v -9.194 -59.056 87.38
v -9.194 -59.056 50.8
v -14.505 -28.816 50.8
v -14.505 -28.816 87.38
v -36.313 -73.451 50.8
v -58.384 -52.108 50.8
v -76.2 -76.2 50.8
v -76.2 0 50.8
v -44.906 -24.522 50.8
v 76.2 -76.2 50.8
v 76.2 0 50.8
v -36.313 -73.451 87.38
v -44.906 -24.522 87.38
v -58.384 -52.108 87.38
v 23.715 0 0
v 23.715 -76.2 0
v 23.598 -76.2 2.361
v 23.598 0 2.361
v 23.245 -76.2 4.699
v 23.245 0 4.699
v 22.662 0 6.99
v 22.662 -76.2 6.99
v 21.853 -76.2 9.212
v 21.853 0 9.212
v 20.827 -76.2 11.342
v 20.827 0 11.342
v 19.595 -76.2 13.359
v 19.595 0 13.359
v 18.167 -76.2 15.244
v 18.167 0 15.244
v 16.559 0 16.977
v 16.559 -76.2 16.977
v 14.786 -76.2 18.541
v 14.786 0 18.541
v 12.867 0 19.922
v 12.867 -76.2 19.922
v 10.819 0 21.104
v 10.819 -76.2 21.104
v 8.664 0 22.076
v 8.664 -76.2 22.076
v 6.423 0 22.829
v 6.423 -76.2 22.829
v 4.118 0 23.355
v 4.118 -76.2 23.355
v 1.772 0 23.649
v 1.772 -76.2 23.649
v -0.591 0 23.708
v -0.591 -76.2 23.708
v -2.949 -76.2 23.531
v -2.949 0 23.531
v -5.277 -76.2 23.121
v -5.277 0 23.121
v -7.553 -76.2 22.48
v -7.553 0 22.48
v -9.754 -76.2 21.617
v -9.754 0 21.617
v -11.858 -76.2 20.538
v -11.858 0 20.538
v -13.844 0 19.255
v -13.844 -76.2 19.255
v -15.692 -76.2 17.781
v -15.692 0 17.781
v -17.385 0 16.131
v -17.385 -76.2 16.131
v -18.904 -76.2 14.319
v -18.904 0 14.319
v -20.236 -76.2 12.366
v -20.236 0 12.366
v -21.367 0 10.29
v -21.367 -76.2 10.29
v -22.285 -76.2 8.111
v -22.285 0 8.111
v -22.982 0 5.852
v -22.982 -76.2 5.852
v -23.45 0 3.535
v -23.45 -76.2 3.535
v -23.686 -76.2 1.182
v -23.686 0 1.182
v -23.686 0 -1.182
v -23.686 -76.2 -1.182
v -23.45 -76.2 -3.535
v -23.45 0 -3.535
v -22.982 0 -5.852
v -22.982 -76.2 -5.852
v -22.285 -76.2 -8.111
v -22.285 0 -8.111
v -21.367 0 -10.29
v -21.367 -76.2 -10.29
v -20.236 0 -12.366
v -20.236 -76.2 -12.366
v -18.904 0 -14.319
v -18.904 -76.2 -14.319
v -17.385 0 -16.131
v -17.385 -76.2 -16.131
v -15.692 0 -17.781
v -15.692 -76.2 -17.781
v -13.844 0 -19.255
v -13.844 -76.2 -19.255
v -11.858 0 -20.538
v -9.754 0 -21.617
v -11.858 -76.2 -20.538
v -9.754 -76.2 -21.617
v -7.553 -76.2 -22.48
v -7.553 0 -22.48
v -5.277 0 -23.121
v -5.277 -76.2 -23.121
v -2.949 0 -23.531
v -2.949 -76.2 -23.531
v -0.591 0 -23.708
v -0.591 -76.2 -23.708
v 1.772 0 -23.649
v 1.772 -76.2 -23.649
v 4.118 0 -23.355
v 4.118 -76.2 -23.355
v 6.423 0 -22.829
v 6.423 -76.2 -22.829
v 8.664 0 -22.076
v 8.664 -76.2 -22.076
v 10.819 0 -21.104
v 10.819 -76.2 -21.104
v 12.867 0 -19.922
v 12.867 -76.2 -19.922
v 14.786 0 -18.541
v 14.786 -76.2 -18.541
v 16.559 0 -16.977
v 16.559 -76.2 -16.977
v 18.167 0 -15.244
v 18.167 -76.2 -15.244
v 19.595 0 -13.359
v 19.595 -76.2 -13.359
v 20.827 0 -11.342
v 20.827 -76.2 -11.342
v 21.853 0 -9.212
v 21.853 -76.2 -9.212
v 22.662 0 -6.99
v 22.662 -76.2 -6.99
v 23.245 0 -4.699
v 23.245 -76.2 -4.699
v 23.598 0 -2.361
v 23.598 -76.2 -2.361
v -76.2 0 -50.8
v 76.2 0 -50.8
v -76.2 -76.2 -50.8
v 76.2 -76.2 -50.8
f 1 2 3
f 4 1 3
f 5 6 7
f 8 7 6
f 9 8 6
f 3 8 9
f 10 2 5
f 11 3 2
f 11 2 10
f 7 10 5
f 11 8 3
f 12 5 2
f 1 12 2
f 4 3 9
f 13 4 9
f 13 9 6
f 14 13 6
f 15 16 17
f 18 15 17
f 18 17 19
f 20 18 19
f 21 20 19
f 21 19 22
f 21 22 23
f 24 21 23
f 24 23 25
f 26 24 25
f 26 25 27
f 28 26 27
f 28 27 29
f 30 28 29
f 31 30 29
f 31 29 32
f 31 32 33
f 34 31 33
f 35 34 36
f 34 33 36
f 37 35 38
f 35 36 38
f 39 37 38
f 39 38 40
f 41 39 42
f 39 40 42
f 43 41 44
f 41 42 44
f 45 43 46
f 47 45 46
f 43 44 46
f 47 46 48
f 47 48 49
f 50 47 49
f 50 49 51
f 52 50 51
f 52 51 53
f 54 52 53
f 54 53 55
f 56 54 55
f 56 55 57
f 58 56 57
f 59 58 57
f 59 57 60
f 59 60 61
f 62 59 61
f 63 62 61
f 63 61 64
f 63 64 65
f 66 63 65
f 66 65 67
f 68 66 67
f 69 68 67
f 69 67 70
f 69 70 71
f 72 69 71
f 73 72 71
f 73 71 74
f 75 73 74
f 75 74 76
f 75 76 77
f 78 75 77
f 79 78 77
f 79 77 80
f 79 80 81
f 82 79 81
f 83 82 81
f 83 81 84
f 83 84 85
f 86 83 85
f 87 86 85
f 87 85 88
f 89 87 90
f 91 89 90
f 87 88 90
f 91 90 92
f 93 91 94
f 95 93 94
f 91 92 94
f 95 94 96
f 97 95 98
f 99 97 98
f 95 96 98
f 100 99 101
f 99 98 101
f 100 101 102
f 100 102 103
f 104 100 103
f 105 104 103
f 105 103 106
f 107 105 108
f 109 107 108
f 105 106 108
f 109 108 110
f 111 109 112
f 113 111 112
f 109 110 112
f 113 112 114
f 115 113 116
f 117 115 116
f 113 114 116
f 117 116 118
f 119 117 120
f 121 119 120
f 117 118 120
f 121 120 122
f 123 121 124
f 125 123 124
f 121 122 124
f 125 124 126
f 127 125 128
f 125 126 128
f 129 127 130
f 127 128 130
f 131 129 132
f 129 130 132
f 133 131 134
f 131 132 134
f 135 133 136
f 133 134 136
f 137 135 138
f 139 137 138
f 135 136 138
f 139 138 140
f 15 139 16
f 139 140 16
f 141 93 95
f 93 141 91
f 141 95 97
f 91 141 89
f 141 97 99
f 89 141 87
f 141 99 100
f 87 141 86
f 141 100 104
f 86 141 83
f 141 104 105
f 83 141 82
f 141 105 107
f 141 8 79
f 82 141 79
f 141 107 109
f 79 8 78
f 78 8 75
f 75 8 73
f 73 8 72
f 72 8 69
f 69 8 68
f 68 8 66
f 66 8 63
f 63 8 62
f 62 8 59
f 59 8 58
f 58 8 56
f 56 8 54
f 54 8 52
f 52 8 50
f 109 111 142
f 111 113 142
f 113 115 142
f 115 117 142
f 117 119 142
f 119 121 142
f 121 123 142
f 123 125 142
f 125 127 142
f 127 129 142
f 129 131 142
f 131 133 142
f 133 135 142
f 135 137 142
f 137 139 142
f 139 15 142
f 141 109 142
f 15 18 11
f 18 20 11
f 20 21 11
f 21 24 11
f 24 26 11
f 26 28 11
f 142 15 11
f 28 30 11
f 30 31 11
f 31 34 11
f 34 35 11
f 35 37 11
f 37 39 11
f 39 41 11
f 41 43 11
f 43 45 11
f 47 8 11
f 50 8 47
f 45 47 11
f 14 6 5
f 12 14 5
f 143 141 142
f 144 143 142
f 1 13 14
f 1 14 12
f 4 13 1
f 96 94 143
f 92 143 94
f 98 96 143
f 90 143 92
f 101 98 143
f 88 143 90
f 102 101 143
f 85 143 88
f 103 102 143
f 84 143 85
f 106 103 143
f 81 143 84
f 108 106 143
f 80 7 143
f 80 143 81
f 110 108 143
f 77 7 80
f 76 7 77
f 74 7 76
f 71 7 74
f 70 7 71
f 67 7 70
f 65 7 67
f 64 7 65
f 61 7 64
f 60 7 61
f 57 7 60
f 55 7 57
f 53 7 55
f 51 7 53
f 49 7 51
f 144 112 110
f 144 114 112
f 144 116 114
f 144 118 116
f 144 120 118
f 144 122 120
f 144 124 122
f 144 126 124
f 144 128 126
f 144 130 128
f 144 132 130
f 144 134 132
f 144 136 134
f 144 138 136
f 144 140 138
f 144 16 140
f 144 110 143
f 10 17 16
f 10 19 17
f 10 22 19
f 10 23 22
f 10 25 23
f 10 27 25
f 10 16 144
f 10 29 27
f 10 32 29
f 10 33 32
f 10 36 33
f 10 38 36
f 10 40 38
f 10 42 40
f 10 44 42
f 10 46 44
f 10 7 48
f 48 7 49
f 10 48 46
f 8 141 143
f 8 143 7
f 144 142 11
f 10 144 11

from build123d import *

# Parameters (mm, degrees)
F0_W     = 152.4
F0_H     = 101.6
F1_DEPTH = 76.2
F2_R     = 23.715347
F3_DEPTH = 76.201
F5_DEPTH = 36.57971


with BuildPart() as f1:
    # F0 (on Front) → F1 (new body)
    with BuildSketch(Plane.XZ):
        Rectangle(F0_W, F0_H)
    extrude(amount=F1_DEPTH)

    # F2 (on face) → F3 (cut, through all)
    with BuildSketch(Plane.XZ.offset(76.2)):
        Circle(F2_R)
    extrude(amount=-F3_DEPTH, mode=Mode.SUBTRACT)

    # F4 (on face) → F5 (join)
    with BuildSketch(Plane.XY.offset(50.8)):
        Polygon((-14.505152, -28.816074), (-44.9058, -24.522467), (-58.38358, -52.108403), (-36.312659, -73.451057), (-9.194299, -59.055606), align=None)
    extrude(amount=F5_DEPTH)


solid = f1.part
